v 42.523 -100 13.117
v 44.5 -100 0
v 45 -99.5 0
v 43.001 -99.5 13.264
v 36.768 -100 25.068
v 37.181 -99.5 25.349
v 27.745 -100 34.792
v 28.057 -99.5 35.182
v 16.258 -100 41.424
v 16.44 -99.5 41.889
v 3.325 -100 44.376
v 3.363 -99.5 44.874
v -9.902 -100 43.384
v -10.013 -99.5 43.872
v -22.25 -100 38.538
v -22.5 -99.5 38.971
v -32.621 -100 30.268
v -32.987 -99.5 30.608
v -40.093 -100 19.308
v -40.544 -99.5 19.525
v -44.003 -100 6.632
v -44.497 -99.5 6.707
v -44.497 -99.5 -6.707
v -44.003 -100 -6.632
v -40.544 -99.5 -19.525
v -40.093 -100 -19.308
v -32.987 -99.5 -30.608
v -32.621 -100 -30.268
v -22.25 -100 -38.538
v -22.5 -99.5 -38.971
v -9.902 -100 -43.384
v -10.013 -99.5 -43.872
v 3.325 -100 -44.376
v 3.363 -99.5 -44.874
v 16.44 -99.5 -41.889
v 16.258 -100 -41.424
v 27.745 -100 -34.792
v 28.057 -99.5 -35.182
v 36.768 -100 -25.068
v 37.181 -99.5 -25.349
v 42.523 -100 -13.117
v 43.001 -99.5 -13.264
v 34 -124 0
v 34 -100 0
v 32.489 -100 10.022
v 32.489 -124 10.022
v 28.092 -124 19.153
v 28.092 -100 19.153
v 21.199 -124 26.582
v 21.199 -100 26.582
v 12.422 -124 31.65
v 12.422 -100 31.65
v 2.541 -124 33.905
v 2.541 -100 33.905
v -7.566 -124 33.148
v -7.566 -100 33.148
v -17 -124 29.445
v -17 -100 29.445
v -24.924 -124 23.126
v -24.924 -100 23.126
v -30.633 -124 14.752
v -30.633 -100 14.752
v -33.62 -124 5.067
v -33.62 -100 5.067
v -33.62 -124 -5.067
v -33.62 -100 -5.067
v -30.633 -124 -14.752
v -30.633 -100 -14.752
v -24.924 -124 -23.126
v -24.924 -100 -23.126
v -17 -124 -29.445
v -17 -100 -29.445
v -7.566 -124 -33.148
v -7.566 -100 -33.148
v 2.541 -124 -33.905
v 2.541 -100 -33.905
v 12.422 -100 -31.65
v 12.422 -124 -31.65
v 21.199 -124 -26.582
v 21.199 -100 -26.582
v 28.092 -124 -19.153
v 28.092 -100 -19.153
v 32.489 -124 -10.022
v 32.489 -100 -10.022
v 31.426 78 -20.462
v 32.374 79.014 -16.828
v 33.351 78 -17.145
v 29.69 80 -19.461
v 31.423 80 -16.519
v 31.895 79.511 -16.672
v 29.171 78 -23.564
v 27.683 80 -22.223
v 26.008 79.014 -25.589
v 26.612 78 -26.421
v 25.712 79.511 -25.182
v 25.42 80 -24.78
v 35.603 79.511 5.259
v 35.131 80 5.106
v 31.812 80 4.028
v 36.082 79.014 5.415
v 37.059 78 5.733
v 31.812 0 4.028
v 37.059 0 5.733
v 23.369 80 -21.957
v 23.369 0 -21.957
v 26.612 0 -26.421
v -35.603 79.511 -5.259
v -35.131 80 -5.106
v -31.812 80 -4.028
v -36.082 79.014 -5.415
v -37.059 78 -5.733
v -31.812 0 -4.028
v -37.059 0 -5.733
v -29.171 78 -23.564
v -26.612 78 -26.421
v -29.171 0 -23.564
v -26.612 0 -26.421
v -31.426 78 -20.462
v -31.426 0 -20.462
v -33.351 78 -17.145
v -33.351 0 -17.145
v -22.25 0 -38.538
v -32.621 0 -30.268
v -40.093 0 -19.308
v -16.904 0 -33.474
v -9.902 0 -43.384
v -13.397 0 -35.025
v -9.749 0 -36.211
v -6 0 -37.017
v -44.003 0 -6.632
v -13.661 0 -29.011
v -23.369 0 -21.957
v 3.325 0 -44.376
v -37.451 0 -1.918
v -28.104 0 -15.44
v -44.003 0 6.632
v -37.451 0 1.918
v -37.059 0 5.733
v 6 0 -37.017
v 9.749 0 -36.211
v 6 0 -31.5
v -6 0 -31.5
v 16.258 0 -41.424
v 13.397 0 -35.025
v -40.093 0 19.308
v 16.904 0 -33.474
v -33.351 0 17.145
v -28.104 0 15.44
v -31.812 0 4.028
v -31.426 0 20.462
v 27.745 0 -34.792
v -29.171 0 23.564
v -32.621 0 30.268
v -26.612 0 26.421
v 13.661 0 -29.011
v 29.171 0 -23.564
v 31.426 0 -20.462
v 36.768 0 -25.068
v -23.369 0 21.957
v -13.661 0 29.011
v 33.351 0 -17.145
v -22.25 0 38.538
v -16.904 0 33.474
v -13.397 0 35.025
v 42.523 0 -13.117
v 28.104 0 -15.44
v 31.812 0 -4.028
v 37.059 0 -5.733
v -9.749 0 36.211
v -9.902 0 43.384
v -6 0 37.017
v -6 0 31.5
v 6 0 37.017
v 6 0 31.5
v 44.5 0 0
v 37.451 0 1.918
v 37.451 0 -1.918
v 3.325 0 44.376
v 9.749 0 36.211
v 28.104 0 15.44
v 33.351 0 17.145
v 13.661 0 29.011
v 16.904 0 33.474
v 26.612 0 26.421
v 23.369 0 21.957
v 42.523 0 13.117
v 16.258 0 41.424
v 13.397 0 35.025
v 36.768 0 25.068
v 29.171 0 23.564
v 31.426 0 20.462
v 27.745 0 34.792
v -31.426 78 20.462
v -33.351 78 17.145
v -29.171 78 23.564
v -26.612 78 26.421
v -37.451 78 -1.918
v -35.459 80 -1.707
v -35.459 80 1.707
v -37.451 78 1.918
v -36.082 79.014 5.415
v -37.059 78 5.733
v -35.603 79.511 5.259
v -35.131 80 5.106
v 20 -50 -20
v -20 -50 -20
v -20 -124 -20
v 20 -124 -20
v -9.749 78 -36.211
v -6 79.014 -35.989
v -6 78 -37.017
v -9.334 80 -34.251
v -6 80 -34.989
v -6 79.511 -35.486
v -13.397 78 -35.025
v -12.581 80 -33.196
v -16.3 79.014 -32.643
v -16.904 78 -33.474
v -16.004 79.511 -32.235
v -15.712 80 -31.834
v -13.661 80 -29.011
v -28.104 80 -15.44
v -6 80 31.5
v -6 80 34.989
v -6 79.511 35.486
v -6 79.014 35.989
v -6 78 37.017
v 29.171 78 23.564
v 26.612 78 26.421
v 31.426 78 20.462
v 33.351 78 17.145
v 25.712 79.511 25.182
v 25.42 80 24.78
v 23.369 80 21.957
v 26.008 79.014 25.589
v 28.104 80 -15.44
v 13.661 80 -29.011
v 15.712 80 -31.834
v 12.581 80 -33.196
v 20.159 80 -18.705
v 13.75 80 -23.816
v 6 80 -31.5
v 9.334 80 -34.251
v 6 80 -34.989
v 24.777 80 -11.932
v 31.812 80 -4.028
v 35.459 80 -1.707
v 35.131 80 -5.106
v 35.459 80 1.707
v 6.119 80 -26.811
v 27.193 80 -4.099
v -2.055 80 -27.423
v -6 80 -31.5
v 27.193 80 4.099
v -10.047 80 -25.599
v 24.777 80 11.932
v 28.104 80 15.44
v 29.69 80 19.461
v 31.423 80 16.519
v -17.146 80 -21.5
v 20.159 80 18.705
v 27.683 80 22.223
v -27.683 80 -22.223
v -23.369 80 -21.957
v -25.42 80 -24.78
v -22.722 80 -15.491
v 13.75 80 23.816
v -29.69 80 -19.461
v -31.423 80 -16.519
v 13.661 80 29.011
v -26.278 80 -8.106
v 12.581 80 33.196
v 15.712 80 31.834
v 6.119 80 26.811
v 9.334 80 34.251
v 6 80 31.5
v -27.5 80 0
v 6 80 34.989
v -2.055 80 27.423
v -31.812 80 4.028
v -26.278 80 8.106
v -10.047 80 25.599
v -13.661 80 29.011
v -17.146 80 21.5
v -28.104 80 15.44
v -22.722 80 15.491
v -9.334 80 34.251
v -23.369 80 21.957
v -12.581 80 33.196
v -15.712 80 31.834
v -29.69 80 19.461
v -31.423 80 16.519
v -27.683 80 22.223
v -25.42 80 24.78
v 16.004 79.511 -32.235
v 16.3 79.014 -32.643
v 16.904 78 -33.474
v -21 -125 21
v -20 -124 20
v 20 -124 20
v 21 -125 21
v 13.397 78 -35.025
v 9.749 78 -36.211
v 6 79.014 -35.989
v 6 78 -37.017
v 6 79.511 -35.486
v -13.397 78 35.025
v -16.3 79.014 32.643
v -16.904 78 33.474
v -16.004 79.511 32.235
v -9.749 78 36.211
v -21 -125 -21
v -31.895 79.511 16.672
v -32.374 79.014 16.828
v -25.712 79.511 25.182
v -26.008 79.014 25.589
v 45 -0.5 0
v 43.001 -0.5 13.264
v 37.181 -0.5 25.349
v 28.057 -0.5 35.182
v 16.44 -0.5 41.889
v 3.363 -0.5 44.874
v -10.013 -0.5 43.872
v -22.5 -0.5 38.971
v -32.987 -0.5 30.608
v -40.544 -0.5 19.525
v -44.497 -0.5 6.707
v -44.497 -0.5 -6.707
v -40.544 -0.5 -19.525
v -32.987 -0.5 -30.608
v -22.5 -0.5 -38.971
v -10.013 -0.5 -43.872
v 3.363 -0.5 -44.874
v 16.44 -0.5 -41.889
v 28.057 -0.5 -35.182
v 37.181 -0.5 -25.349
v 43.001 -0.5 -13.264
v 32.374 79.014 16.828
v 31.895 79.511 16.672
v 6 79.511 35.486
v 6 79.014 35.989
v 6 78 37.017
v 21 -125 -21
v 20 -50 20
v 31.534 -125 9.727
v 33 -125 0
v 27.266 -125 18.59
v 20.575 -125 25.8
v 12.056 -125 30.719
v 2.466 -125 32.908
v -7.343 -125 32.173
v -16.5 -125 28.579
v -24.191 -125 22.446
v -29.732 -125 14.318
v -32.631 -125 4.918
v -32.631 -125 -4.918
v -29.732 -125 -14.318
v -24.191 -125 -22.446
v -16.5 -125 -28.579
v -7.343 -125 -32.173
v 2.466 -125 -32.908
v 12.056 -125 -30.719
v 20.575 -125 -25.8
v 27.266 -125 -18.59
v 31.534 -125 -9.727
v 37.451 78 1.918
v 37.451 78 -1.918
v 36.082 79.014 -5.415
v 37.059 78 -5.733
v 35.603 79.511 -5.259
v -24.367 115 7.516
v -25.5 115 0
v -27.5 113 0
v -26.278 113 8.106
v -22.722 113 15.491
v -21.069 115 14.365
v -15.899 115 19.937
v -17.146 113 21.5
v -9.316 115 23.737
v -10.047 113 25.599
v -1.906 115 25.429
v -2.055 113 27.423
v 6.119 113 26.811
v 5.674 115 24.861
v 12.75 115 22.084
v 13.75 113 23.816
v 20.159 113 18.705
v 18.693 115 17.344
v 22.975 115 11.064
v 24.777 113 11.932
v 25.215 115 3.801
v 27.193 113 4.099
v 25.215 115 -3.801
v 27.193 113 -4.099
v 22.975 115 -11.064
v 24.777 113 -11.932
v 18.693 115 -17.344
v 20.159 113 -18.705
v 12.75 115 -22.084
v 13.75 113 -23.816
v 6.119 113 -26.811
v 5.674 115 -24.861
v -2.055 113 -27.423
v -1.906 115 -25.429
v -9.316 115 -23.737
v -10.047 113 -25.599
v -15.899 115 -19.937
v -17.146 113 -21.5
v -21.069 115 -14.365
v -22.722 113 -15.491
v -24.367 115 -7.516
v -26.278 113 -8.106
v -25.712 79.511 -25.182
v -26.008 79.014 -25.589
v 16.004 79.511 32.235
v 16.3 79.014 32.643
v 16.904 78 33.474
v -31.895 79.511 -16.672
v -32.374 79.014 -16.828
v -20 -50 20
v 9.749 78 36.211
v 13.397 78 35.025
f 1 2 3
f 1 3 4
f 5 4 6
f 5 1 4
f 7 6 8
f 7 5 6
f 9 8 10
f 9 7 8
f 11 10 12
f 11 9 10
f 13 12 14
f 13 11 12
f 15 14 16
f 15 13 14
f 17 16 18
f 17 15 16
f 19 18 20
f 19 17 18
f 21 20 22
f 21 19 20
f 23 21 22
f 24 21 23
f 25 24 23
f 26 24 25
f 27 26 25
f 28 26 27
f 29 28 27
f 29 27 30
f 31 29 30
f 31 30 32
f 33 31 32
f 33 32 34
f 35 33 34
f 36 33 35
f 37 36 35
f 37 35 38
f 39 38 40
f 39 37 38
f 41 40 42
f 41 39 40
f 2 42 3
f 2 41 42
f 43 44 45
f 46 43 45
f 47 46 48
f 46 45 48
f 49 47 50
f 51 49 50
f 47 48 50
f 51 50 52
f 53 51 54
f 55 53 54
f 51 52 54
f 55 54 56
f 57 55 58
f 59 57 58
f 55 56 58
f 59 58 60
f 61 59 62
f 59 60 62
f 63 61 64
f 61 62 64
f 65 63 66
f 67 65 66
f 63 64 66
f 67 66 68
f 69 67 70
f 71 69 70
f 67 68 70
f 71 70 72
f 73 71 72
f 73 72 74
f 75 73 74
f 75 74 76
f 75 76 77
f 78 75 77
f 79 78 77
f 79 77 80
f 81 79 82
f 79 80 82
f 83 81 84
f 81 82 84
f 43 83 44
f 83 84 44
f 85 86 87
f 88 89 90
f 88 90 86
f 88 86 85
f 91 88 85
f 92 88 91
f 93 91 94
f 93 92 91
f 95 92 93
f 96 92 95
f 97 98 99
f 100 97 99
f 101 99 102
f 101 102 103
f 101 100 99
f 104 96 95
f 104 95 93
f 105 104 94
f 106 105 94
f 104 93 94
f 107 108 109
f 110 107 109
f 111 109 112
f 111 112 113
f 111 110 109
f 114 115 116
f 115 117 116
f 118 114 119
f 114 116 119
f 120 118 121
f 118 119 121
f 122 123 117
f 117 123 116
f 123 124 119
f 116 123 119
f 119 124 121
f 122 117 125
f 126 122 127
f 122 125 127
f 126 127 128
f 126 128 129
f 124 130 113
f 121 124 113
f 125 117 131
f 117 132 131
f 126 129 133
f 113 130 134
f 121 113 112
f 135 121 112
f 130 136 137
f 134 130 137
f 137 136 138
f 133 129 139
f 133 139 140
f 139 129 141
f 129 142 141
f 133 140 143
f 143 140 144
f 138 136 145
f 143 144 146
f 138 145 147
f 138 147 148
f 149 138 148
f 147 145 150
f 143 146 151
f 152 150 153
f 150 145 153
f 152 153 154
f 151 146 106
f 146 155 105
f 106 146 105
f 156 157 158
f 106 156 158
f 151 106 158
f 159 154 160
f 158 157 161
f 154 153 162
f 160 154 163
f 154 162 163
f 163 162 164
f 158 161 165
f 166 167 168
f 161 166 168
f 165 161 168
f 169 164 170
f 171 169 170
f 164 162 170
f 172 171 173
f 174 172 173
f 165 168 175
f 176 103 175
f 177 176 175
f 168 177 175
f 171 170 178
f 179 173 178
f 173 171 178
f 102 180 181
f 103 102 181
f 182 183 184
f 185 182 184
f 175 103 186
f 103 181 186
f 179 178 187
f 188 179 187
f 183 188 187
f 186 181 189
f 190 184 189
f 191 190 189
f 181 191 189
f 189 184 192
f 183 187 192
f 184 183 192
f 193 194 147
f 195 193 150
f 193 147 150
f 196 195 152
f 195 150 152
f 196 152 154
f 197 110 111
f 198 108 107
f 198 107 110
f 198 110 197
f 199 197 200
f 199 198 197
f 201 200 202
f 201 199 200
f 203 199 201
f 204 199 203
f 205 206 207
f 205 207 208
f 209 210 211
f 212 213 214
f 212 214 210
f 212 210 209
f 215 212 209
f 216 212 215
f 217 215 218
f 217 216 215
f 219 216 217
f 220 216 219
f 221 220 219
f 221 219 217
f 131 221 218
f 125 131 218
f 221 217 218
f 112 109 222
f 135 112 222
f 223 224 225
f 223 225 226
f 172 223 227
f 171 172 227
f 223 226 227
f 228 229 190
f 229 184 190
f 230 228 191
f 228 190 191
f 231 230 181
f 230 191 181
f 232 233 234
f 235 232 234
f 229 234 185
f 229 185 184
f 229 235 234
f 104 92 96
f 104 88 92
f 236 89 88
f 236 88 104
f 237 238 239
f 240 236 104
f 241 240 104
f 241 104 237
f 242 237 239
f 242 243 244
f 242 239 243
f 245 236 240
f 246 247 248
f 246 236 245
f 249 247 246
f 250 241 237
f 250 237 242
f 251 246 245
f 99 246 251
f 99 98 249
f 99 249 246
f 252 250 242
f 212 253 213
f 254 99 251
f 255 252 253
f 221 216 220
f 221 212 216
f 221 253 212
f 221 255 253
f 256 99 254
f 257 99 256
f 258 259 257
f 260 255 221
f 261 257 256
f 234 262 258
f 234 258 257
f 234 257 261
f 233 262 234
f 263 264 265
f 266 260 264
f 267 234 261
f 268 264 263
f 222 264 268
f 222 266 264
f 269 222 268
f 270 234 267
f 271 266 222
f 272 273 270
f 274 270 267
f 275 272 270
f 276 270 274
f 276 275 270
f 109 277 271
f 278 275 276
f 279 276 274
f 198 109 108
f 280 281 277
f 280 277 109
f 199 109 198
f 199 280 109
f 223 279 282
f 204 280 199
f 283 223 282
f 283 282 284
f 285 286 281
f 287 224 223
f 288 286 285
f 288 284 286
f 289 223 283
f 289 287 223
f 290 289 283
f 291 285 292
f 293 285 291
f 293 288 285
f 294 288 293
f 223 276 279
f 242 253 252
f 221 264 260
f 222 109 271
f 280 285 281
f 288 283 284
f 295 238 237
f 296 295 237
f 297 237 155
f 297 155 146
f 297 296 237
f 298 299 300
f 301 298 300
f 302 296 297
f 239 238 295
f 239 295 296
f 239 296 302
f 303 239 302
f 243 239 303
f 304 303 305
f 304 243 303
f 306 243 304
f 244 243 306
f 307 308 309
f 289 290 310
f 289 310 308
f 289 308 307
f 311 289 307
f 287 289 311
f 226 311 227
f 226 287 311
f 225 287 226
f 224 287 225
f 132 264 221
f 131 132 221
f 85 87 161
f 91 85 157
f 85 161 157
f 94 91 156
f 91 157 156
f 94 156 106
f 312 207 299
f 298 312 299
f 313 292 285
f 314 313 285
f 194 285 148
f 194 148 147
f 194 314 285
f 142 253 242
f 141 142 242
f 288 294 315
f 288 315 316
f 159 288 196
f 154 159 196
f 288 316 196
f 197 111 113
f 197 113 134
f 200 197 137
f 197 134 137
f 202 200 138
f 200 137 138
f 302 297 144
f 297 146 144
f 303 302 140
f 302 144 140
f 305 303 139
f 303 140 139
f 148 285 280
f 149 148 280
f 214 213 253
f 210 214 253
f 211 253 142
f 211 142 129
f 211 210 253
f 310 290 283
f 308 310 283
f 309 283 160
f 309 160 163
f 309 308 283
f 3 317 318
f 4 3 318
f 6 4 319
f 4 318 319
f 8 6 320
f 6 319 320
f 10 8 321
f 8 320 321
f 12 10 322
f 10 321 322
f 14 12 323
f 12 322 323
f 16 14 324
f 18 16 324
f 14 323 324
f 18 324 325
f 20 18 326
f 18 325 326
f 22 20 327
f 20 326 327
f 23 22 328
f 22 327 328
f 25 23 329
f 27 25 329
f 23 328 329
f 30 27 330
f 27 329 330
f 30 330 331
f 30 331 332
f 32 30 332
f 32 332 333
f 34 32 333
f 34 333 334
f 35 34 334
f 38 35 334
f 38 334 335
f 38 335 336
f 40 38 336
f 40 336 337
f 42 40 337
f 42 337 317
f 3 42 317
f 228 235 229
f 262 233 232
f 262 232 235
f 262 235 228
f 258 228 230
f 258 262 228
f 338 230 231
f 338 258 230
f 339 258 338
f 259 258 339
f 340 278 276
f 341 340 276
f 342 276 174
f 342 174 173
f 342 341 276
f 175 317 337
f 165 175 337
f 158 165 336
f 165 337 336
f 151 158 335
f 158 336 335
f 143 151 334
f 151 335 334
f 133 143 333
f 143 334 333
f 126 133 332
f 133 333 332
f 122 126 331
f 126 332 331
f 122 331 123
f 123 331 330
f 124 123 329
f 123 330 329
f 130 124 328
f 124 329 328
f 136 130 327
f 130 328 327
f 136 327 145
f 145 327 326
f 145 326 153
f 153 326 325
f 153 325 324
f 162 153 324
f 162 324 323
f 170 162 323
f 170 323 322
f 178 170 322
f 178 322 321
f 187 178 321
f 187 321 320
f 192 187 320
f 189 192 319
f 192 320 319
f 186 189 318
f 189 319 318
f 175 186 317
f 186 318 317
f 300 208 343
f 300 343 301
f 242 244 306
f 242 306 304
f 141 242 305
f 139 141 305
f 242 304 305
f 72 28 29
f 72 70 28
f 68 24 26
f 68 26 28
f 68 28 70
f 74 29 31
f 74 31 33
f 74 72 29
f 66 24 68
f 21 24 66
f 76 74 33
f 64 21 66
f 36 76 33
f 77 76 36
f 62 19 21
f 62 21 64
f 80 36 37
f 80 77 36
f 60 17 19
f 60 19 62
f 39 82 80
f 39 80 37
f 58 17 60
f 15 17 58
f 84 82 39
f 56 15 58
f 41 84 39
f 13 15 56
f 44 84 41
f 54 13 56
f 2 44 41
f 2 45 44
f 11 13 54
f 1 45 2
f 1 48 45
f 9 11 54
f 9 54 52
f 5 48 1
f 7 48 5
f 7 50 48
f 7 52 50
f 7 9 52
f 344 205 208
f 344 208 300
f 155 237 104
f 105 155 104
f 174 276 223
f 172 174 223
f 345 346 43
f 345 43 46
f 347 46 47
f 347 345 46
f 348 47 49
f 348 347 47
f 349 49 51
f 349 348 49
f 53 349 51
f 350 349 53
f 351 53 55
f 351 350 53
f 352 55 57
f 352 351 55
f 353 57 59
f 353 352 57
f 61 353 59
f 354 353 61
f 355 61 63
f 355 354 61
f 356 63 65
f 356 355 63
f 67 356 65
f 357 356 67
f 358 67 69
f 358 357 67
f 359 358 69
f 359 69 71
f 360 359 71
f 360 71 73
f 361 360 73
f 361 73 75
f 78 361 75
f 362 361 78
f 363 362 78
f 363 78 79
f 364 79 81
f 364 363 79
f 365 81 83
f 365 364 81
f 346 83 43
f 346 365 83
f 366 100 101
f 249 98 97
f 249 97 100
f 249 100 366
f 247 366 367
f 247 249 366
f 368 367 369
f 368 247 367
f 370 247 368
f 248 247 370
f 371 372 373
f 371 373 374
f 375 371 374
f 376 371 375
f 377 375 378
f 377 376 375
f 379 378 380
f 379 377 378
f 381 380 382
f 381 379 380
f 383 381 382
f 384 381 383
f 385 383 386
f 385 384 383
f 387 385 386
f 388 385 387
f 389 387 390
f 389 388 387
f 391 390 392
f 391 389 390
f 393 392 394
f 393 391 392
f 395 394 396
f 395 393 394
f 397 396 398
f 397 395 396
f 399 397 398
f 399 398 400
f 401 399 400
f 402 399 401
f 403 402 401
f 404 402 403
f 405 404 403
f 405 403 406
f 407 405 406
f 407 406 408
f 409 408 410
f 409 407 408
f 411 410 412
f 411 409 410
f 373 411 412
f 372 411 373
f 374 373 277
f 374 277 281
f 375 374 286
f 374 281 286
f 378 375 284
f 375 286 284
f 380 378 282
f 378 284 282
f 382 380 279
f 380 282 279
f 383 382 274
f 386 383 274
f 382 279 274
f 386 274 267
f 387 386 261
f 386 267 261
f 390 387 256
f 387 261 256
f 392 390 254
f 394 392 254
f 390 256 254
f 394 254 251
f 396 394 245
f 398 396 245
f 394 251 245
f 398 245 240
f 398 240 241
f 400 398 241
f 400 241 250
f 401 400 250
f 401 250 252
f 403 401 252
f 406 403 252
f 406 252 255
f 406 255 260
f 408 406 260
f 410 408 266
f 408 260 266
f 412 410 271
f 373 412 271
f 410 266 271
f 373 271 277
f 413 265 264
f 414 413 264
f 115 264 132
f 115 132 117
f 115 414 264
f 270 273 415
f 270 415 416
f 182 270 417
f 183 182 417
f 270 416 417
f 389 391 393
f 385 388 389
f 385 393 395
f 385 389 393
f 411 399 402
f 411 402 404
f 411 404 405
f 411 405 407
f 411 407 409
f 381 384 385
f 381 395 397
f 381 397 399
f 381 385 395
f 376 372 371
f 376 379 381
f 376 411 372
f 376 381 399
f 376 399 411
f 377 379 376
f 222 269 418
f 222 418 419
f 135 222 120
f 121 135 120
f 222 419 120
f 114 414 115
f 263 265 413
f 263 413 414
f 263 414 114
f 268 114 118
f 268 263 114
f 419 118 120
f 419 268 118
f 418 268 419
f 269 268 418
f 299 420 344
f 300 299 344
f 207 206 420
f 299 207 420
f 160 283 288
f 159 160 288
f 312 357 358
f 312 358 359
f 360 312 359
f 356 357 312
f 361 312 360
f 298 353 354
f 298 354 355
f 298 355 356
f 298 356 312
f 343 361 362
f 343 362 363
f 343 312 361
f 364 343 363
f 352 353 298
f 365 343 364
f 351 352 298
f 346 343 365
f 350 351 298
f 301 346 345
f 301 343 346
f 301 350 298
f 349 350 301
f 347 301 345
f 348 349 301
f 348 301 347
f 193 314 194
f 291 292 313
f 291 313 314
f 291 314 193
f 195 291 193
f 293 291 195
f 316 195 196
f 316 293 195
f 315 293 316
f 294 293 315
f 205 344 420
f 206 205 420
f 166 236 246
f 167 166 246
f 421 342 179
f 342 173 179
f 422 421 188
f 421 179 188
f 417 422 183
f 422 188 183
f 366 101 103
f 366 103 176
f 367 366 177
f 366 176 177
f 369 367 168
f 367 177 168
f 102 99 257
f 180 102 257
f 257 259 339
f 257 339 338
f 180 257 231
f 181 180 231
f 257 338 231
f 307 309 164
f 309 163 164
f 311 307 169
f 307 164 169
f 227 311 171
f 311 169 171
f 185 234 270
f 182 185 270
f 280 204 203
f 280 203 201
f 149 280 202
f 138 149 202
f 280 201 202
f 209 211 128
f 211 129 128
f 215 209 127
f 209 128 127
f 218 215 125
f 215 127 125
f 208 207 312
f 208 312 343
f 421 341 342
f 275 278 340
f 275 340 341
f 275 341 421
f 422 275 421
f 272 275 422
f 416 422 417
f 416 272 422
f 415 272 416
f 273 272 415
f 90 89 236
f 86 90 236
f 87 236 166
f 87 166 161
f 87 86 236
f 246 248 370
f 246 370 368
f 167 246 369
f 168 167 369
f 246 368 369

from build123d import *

# Parameters (mm, degrees)
F0_R            = 45
F0_W            = 40
F0_H            = 40
F1_DEPTH        = 100
F2_R            = 34
F2_W            = 40
F2_H            = 40
F3_DEPTH        = 25
F4_R            = 37.5
F5_DEPTH        = 80
F5_DEPTH_BACK   = 50
F6_SIZE         = 2
F7_W            = 12
F7_H            = 15
F8_DEPTH        = 80
F8_COPIES_COUNT = 10
F9_SIZE         = 0.5
F10_R           = 27.5
F11_DEPTH       = 35
F12_SIZE        = 2
F13_SIZE        = 1


# Not quite as in the source:
# - a pattern or mirror of a feature is missing from the dataset's text; its kind, count and spacing are read off the source's solid


with BuildPart() as f1:
    # F0 (on Front) → F1 (new body)
    with BuildSketch(Plane.XZ):
        Circle(F0_R)
        Rectangle(F0_W, F0_H, mode=Mode.SUBTRACT)
    extrude(amount=F1_DEPTH)

    # F2 (on face) → F3 (join)
    with BuildSketch(Plane.XZ.offset(100)):
        Circle(F2_R)
        Rectangle(F2_W, F2_H, mode=Mode.SUBTRACT)
    extrude(amount=F3_DEPTH)

    # F4 (on face) → F5 (join, two sides)
    with BuildSketch(Plane(origin=(0, 0, 0), x_dir=(-1, 0, 0), z_dir=(0, 1, 0))) as f5_sk:
        Circle(F4_R)
    extrude(amount=F5_DEPTH)
    extrude(f5_sk.sketch, amount=-F5_DEPTH_BACK)

    # F6
    f6_edges = [f1.edges().sort_by_distance(p)[0] for p in [
        (37.5, 80, 0),
    ]]
    chamfer(f6_edges, length=F6_SIZE)

    # F7 (on face) → F8 (cut, through all)
    with BuildSketch(Plane(origin=(0, 80, 0), x_dir=(-1, 0, 0), z_dir=(0, 1, 0))):
        with Locations((0, 39)):
            Rectangle(F7_W, F7_H)
    f8 = extrude(amount=-F8_DEPTH, mode=Mode.SUBTRACT)

    # F8_copies: F8 ×10 about axis
    f8_copies_axis = Axis((0, 0, 0), (0, 1, 0))
    for i in range(1, F8_COPIES_COUNT):
        add(f8.rotate(f8_copies_axis, i * 360 / F8_COPIES_COUNT), mode=Mode.SUBTRACT)

    # F9
    f9_edges = [f1.edges().sort_by_distance(p)[0] for p in [
        (45, -50, 0),
        (-45, 0, 0),
        (-45, -100, 0),
    ]]
    chamfer(f9_edges, length=F9_SIZE)

    # F10 (on face) → F11 (join)
    with BuildSketch(Plane(origin=(0, 80, 0), x_dir=(-1, 0, 0), z_dir=(0, 1, 0))):
        Circle(F10_R)
    extrude(amount=F11_DEPTH)

    # F12
    f12_edges = [f1.edges().sort_by_distance(p)[0] for p in [
        (27.5, 115, 0),
    ]]
    chamfer(f12_edges, length=F12_SIZE)

    # F13
    f13_edges = [f1.edges().sort_by_distance(p)[0] for p in [
        (-34, -125, 0),
        (0, -125, 20),
        (20, -125, 0),
        (0, -125, -20),
        (-20, -125, 0),
    ]]
    chamfer(f13_edges, length=F13_SIZE)


solid = f1.part
